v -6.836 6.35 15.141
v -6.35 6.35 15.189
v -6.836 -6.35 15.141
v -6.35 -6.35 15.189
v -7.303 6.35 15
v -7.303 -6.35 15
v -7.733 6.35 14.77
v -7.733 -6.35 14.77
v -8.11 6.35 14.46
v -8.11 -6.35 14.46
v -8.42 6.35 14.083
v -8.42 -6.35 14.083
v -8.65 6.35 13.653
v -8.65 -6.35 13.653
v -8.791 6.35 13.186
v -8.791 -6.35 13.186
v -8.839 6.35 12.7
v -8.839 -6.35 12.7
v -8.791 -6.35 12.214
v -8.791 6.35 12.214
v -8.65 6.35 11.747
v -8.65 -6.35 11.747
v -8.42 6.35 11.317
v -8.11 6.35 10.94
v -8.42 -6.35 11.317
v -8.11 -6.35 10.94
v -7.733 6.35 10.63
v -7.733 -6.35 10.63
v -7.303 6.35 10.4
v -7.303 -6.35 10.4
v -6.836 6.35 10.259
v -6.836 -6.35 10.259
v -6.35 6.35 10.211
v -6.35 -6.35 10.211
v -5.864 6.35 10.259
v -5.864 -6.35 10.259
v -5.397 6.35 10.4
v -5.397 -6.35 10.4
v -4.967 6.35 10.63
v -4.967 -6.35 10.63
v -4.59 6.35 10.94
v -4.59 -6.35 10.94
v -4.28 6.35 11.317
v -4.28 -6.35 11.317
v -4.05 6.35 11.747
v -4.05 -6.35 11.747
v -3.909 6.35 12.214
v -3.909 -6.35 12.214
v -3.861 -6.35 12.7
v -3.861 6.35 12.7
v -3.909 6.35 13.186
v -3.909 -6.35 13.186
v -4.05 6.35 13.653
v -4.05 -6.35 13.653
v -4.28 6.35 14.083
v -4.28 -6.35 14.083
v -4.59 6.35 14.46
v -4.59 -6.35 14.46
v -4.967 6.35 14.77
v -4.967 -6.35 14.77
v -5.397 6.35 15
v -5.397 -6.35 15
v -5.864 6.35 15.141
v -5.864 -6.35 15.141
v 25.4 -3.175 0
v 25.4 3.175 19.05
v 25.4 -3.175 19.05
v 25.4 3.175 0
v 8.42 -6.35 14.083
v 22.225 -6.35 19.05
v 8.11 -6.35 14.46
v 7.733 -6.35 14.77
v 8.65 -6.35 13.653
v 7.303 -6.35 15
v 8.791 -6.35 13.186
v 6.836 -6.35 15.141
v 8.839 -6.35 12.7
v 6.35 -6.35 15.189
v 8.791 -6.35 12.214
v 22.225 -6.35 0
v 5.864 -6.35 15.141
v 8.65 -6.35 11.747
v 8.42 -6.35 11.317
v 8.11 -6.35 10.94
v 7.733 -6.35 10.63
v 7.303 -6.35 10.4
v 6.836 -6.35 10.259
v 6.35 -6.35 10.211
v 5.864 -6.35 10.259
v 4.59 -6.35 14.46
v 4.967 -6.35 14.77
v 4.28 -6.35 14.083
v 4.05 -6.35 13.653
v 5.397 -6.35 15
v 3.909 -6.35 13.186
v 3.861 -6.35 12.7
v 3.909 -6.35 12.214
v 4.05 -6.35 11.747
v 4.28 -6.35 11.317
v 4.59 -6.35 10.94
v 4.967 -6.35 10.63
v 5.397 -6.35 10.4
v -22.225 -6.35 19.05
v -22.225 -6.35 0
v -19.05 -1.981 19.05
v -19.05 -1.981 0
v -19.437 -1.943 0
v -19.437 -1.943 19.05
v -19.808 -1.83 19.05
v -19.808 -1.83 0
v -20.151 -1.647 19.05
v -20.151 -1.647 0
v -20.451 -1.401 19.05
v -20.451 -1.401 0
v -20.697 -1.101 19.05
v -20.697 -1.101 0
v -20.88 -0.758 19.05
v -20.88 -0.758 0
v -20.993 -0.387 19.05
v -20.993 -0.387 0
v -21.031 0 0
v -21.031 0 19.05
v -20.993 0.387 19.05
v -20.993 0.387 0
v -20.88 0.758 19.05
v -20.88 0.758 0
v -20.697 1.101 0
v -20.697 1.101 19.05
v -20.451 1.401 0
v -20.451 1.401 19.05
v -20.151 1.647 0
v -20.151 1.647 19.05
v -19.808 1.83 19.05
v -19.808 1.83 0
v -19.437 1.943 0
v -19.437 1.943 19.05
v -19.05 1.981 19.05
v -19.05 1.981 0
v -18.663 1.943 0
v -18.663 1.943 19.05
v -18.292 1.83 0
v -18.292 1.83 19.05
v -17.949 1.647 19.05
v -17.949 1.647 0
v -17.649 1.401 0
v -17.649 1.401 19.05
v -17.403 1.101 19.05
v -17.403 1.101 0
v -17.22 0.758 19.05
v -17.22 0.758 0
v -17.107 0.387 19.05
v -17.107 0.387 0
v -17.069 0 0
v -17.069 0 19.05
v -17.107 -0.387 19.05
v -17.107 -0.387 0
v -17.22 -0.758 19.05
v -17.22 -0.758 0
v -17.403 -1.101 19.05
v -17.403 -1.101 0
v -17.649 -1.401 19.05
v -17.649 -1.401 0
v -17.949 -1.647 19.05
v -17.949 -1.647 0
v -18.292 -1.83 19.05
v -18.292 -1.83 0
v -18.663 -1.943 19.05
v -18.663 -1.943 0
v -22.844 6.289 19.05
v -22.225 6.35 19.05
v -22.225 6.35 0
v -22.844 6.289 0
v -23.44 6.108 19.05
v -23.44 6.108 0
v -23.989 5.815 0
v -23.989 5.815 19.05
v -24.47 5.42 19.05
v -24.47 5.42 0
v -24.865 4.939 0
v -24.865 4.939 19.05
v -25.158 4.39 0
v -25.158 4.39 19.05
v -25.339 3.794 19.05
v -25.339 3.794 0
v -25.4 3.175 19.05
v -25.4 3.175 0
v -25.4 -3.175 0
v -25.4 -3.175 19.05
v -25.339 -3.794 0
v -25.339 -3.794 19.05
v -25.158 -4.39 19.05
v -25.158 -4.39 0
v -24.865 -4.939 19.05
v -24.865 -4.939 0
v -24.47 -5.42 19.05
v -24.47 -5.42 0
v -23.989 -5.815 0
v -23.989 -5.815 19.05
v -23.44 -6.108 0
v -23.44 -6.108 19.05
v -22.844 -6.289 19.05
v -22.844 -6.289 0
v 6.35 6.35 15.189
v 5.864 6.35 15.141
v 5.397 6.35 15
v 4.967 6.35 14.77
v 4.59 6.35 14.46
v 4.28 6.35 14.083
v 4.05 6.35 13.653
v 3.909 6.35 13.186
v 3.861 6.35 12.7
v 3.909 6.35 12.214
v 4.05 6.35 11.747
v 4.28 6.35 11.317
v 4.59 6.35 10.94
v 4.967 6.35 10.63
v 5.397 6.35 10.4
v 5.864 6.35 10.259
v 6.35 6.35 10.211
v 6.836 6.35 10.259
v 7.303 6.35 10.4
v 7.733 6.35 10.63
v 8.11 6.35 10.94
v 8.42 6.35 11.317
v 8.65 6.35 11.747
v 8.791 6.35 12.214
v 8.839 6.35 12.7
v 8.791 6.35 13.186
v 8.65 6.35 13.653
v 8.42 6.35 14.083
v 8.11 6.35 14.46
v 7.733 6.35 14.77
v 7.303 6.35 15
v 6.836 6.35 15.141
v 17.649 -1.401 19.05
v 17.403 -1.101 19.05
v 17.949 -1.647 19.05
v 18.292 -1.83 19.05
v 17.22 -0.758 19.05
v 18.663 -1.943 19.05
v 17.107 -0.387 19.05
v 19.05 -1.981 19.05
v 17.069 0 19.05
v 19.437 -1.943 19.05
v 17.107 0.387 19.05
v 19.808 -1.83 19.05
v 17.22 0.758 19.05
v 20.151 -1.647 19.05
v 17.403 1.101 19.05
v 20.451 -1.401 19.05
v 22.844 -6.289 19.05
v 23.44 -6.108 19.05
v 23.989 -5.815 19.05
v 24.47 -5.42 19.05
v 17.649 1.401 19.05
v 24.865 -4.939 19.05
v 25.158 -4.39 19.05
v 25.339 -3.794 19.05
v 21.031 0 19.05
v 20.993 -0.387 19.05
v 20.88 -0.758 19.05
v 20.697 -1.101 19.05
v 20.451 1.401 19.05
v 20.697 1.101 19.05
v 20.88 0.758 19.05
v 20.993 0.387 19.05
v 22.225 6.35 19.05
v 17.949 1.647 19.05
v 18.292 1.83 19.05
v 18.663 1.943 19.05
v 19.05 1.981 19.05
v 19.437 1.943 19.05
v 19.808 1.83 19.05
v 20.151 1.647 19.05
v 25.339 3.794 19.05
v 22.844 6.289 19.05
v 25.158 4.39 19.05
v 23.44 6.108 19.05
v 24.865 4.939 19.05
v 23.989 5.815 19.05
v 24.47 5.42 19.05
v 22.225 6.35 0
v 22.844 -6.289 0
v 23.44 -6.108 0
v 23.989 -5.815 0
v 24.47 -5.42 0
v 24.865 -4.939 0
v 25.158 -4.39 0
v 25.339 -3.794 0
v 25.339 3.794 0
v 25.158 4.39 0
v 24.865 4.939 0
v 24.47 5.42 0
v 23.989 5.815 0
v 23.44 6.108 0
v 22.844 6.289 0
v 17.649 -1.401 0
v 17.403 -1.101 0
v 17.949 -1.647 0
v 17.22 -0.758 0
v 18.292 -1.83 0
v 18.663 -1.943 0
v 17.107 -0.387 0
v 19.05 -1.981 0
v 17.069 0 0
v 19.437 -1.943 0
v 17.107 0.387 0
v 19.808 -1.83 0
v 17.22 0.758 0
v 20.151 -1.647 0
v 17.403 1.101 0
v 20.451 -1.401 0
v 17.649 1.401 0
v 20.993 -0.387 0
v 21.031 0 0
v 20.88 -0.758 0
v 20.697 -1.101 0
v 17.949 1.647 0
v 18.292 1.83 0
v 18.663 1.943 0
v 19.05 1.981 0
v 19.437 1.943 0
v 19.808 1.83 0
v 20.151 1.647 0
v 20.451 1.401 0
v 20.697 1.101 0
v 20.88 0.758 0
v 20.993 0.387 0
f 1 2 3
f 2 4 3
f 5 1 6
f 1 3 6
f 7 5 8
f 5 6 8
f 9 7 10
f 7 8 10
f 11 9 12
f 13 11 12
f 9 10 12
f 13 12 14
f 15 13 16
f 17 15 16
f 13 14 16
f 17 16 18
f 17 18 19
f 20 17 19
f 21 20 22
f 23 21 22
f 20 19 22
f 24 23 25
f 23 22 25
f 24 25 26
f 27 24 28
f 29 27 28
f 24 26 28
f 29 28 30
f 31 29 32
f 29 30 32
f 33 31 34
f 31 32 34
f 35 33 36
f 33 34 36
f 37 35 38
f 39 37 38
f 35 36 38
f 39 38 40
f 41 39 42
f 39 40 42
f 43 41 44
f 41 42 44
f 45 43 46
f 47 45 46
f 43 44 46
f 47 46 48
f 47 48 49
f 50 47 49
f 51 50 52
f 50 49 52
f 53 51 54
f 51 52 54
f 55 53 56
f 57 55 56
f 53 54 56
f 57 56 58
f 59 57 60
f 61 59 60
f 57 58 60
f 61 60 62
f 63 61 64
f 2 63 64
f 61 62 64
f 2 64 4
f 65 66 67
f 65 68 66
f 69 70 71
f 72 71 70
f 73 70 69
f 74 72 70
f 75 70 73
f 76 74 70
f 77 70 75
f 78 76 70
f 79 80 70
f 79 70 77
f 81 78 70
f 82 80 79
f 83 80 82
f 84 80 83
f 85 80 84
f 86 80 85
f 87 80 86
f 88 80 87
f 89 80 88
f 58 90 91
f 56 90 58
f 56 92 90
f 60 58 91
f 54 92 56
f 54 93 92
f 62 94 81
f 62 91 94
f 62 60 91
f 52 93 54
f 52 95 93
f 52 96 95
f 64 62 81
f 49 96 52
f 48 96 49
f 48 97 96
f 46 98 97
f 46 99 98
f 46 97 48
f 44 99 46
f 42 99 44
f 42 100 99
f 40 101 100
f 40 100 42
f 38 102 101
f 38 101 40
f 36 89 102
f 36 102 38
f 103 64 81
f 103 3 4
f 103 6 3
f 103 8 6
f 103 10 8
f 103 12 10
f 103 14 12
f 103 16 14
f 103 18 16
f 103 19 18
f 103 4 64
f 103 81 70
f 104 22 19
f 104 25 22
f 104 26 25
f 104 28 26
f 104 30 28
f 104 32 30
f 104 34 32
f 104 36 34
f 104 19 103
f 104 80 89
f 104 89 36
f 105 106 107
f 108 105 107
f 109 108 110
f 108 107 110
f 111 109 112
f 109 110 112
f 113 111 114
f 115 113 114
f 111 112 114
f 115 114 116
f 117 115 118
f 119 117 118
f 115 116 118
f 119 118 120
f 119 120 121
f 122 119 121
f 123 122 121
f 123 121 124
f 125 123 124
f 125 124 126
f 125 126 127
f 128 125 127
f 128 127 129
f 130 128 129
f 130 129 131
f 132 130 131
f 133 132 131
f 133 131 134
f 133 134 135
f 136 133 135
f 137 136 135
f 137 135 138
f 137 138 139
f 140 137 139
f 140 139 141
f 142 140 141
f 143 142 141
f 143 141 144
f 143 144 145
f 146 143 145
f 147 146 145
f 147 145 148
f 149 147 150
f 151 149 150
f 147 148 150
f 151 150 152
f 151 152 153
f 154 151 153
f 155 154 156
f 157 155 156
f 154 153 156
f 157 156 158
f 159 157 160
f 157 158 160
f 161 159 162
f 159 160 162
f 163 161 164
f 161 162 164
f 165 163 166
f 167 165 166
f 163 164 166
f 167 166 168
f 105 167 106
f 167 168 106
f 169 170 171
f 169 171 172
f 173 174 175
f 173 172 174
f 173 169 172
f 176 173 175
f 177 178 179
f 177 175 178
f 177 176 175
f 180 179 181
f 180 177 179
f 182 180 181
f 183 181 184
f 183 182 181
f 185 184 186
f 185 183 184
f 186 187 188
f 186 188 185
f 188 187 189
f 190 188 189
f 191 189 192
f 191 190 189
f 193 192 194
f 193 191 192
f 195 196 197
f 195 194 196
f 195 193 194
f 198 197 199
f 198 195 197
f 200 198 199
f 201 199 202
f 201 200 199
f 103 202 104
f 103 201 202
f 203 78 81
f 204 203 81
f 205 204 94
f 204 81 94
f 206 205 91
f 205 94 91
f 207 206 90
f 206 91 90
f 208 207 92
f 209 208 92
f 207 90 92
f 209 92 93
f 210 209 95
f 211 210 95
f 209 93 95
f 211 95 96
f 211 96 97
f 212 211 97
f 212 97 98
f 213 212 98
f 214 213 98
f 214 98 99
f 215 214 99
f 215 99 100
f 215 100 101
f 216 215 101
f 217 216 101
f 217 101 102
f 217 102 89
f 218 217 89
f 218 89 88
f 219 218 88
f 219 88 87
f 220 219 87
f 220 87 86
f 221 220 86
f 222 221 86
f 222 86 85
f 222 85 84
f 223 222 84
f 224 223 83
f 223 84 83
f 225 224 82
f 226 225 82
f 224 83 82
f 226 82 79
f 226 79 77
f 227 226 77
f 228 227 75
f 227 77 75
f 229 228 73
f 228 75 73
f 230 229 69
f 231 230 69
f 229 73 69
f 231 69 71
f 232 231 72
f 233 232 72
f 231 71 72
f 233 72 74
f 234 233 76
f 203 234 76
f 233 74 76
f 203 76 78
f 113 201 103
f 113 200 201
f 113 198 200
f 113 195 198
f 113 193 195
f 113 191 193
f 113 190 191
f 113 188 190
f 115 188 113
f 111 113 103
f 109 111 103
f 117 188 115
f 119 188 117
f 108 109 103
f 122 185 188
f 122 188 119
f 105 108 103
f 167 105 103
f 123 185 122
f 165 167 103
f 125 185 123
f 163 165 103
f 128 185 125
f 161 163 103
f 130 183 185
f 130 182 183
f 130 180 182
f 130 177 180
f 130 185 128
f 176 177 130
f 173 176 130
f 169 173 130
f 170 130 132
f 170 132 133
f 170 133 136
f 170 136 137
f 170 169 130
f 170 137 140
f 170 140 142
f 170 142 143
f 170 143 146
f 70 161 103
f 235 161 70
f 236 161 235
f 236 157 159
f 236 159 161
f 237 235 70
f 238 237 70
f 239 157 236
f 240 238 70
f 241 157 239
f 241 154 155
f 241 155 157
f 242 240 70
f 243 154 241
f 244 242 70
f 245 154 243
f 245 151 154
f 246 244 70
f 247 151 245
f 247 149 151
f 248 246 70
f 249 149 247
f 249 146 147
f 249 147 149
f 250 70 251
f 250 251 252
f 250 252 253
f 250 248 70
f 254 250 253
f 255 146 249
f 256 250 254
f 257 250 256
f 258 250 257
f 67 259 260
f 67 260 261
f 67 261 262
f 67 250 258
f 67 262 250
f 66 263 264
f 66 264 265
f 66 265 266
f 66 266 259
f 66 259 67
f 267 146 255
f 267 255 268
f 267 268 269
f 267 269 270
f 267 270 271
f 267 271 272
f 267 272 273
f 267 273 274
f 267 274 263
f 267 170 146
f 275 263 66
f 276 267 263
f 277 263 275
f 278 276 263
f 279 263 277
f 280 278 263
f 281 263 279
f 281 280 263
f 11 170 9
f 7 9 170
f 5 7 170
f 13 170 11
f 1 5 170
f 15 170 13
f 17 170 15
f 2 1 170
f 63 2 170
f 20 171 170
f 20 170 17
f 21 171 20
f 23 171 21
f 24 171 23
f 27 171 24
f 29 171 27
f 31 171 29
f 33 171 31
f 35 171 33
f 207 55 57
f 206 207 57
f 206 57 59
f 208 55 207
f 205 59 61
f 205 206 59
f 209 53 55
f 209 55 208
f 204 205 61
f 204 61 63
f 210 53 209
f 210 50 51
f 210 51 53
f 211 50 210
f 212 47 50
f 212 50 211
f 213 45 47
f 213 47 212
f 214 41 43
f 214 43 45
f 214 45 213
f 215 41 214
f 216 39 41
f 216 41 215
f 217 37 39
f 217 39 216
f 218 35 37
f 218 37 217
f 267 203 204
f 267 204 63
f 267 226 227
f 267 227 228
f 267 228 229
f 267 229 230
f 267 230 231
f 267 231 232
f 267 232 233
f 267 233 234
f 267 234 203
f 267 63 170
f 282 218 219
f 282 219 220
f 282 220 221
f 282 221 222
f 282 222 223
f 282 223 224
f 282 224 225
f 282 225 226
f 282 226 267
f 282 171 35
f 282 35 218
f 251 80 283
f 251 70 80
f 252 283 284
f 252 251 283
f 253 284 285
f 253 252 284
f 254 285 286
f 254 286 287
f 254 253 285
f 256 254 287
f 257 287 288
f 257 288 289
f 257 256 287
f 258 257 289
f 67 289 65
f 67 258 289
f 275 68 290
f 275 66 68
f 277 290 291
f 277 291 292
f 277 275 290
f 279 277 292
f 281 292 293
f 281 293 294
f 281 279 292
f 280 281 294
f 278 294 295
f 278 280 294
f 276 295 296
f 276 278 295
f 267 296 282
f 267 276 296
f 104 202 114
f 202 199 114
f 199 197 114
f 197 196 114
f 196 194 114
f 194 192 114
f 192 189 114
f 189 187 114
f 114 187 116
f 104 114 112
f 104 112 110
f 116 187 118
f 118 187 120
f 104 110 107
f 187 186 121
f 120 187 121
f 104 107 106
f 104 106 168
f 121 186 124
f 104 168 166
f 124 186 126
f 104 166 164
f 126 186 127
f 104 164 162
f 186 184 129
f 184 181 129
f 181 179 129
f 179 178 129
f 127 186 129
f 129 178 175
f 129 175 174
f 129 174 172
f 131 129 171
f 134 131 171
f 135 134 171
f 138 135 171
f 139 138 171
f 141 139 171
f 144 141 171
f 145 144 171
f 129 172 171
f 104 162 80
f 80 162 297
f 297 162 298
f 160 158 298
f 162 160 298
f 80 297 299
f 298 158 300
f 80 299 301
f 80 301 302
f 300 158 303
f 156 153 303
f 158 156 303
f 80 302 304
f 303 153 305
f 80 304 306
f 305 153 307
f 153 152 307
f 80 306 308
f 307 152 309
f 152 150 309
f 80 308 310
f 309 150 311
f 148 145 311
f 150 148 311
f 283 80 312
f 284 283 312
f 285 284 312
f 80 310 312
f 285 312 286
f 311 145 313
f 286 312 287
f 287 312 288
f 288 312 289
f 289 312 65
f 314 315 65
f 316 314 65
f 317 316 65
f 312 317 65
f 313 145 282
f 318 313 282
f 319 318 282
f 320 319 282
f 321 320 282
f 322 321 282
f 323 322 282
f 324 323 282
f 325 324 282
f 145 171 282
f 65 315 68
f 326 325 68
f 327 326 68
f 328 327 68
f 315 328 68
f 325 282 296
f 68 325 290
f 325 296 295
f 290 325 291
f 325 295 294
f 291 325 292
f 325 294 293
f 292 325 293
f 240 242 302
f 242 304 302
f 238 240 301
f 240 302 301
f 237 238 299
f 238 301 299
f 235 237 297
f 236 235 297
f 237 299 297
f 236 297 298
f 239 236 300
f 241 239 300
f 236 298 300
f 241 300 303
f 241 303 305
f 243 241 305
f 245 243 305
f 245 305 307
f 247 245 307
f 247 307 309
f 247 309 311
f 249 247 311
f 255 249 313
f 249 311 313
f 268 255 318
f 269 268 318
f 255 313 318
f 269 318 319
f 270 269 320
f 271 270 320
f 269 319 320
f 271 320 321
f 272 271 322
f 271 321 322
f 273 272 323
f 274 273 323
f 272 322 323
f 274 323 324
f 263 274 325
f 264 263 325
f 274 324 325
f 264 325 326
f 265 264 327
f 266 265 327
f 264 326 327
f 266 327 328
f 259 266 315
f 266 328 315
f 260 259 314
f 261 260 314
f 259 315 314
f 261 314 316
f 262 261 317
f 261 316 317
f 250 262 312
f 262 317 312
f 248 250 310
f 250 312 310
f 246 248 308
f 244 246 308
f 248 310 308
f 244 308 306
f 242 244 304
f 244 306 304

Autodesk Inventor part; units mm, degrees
ref_plane "YZ Plane" through (0, 0, 0) normal (1, 0, 0) x (0, 1, 0)
ref_plane "XZ Plane" through (0, 0, 0) normal (0, 1, 0) x (-1, 0, 0)
ref_plane "XY Plane" through (0, 0, 0) normal (0, 0, 1) x (1, 0, 0)
sketch "Sketch1" plane through (0, 0, 0) normal (0, 0, 1) x (1, 0, 0)
  line L0 (25.4, -6.35) -> (-25.4, -6.35)
  line L1 (-25.4, -6.35) -> (-25.4, 6.35)
  line L2 (-25.4, 6.35) -> (25.4, 6.35)
  line L3 (25.4, 6.35) -> (25.4, -6.35)
  line L4 (25.4, -6.35) -> (-25.4, 6.35) construction
  line L5 (-25.4, -6.35) -> (25.4, 6.35) construction
  point P0 (0, 0)
  dimension "d0" = 50.8
  dimension "d1" = 12.7
extrude "Extrusion1" add sketch "Sketch1" along normal blind 19.05
sketch "Sketch2" plane through (-25.4, 6.35, 0) normal (0, 1, 0) x (1, 0, 0)
  line L0 (0, 0) -> (0, -19.05) construction
  line L1 (19.05, -12.7) -> (31.75, -12.7) construction
  line L2 (50.8, 0) -> (0, 0) construction
  line L3 (50.8, -19.05) -> (0, -19.05) construction
  point P0 (25.4, 0)
  point P1 (0, -9.525)
  point P2 (25.4, -12.7)
  point P3 (25.4, 0)
  point P4 (25.4, 0)
  dimension "d4" = 12.7
  dimension "d20" = 6.35
hole "Hole1" at (-6.35, 6.35, 12.7) at (6.35, 6.35, 12.7) direction (0, -1, 0) diameter 4.9784 end through all thread size "1/4-20 UNC" class "2B" standard "ANSI Unified Screw Threads"
sketch "Sketch3" plane through (0, 0, 19.05) normal (0, 0, 1) x (1, 0, 0)
  line L0 (-19.05, 0) -> (19.05, 0) construction
  line L1 (-25.4, 6.35) -> (-25.4, -6.35) construction
  line L2 (25.4, 6.35) -> (-25.4, 6.35) construction
  point P0 (0, 0)
  point P1 (-25.4, 0)
  point P2 (0, 0)
  point P3 (0, 6.35)
  dimension "d12" = 38.1
hole "Hole2" at (-19.05, 0, 19.05) at (19.05, 0, 19.05) direction (0, 0, -1) diameter 3.9624 end through all thread size "10-32 UNF" class "2B" standard "ANSI Unified Screw Threads"
fillet "Fillet1" radius 3.175 4 edges at (-25.4, 6.35, 9.525) (-25.4, -6.35, 9.525) (25.4, 6.35, 9.525) (25.4, -6.35, 9.525)
properties part number "CL7-014" material "Aluminum 6061"
